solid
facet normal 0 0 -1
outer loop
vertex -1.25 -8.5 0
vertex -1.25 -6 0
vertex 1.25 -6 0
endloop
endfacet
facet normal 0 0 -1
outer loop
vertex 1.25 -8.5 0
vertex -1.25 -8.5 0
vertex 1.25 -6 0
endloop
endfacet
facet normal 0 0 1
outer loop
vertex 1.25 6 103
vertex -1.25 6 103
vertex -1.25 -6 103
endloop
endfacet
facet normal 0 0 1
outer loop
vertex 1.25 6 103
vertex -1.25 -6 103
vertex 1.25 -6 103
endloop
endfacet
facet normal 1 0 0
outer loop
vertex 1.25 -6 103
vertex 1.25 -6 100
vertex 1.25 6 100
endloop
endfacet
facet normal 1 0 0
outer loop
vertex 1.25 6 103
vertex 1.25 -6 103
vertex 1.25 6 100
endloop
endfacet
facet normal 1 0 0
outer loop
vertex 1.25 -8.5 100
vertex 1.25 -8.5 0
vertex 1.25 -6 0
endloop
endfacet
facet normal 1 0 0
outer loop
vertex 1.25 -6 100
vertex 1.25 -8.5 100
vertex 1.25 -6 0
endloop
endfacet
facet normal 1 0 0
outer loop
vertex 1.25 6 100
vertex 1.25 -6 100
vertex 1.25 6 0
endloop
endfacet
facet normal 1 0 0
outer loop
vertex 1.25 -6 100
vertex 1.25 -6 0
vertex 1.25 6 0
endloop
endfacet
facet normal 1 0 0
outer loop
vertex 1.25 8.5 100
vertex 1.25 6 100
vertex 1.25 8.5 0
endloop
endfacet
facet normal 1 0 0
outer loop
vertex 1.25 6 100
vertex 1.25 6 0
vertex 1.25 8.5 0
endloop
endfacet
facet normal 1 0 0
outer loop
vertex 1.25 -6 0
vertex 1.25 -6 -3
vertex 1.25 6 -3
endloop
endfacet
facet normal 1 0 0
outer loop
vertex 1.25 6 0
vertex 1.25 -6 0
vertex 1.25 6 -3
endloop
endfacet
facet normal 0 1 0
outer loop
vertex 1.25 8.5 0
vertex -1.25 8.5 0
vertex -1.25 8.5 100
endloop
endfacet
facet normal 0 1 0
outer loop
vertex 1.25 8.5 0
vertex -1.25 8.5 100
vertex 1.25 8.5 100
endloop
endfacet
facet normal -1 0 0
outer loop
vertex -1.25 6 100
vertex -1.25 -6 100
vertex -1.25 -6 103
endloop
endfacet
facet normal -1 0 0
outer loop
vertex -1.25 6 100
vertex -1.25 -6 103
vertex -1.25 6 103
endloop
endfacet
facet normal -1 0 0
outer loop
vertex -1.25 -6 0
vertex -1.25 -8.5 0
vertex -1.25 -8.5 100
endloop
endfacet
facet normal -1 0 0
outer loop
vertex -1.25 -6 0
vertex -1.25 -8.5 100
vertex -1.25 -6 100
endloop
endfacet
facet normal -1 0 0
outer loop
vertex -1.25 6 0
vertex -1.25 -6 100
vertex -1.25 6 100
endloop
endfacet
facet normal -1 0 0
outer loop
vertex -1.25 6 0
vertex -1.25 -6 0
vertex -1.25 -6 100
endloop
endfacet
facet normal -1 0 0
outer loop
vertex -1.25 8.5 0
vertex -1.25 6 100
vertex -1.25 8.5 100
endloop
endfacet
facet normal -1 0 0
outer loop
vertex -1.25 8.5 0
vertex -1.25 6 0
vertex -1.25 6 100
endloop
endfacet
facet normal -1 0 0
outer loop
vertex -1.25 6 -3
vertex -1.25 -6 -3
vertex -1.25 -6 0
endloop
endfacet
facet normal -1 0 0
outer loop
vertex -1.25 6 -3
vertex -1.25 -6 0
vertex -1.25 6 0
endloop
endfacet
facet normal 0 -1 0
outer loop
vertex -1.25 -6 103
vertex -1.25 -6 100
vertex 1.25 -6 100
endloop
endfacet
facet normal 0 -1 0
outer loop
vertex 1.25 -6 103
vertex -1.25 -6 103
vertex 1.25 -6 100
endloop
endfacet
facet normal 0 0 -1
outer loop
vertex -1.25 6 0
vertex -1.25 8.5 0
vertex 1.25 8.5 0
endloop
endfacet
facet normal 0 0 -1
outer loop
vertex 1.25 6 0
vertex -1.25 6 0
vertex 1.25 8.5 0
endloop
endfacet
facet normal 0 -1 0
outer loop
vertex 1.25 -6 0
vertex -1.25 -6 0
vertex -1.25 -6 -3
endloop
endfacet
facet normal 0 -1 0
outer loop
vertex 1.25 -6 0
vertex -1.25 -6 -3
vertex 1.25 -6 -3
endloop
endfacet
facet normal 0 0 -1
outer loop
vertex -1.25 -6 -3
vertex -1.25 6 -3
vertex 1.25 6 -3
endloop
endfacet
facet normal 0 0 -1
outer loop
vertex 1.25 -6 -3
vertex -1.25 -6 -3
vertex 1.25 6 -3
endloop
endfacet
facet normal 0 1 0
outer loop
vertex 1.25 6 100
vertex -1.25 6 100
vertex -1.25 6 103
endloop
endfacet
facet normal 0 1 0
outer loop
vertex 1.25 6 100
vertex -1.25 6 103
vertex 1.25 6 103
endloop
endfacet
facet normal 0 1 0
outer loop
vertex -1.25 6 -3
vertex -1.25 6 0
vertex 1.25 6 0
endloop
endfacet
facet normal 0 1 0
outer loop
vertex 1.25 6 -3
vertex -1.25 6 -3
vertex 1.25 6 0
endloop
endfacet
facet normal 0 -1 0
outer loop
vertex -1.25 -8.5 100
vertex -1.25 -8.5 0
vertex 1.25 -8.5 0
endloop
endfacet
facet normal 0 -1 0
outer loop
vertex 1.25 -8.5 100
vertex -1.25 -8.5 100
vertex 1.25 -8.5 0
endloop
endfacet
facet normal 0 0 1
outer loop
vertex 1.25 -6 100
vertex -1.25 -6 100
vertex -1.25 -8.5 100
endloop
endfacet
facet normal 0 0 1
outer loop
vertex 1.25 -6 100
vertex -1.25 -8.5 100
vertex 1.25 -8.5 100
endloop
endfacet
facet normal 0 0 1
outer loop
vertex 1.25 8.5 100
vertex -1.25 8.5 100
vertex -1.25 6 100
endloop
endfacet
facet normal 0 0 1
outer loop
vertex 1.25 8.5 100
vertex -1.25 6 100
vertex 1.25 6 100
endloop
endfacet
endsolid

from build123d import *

# Parameters (mm, degrees)
SKETCH1_W           = 2.5
SKETCH1_H           = 17
BOSS_EXTRUDE1_DEPTH = 100
SKETCH1_3_W         = 2.5
SKETCH1_3_H         = 12
BOSS_EXTRUDE2_DEPTH = 3


with BuildPart() as part:
    # Sketch1 → Boss-Extrude1 (new body)
    with BuildSketch(Plane.XY):
        Rectangle(SKETCH1_W, SKETCH1_H)
    extrude(amount=BOSS_EXTRUDE1_DEPTH)

    # Sketch1<3> → Boss-Extrude2 (add)
    with BuildSketch(Plane.XY):
        Rectangle(SKETCH1_3_W, SKETCH1_3_H)
    boss_extrude2 = extrude(amount=-BOSS_EXTRUDE2_DEPTH)

    # Mirror1: Boss-Extrude2 across plane
    add(boss_extrude2.mirror(Plane(origin=(0, 0, 50), x_dir=(1, 0, 0), z_dir=(0, 0, -1))))


solid = part.part
